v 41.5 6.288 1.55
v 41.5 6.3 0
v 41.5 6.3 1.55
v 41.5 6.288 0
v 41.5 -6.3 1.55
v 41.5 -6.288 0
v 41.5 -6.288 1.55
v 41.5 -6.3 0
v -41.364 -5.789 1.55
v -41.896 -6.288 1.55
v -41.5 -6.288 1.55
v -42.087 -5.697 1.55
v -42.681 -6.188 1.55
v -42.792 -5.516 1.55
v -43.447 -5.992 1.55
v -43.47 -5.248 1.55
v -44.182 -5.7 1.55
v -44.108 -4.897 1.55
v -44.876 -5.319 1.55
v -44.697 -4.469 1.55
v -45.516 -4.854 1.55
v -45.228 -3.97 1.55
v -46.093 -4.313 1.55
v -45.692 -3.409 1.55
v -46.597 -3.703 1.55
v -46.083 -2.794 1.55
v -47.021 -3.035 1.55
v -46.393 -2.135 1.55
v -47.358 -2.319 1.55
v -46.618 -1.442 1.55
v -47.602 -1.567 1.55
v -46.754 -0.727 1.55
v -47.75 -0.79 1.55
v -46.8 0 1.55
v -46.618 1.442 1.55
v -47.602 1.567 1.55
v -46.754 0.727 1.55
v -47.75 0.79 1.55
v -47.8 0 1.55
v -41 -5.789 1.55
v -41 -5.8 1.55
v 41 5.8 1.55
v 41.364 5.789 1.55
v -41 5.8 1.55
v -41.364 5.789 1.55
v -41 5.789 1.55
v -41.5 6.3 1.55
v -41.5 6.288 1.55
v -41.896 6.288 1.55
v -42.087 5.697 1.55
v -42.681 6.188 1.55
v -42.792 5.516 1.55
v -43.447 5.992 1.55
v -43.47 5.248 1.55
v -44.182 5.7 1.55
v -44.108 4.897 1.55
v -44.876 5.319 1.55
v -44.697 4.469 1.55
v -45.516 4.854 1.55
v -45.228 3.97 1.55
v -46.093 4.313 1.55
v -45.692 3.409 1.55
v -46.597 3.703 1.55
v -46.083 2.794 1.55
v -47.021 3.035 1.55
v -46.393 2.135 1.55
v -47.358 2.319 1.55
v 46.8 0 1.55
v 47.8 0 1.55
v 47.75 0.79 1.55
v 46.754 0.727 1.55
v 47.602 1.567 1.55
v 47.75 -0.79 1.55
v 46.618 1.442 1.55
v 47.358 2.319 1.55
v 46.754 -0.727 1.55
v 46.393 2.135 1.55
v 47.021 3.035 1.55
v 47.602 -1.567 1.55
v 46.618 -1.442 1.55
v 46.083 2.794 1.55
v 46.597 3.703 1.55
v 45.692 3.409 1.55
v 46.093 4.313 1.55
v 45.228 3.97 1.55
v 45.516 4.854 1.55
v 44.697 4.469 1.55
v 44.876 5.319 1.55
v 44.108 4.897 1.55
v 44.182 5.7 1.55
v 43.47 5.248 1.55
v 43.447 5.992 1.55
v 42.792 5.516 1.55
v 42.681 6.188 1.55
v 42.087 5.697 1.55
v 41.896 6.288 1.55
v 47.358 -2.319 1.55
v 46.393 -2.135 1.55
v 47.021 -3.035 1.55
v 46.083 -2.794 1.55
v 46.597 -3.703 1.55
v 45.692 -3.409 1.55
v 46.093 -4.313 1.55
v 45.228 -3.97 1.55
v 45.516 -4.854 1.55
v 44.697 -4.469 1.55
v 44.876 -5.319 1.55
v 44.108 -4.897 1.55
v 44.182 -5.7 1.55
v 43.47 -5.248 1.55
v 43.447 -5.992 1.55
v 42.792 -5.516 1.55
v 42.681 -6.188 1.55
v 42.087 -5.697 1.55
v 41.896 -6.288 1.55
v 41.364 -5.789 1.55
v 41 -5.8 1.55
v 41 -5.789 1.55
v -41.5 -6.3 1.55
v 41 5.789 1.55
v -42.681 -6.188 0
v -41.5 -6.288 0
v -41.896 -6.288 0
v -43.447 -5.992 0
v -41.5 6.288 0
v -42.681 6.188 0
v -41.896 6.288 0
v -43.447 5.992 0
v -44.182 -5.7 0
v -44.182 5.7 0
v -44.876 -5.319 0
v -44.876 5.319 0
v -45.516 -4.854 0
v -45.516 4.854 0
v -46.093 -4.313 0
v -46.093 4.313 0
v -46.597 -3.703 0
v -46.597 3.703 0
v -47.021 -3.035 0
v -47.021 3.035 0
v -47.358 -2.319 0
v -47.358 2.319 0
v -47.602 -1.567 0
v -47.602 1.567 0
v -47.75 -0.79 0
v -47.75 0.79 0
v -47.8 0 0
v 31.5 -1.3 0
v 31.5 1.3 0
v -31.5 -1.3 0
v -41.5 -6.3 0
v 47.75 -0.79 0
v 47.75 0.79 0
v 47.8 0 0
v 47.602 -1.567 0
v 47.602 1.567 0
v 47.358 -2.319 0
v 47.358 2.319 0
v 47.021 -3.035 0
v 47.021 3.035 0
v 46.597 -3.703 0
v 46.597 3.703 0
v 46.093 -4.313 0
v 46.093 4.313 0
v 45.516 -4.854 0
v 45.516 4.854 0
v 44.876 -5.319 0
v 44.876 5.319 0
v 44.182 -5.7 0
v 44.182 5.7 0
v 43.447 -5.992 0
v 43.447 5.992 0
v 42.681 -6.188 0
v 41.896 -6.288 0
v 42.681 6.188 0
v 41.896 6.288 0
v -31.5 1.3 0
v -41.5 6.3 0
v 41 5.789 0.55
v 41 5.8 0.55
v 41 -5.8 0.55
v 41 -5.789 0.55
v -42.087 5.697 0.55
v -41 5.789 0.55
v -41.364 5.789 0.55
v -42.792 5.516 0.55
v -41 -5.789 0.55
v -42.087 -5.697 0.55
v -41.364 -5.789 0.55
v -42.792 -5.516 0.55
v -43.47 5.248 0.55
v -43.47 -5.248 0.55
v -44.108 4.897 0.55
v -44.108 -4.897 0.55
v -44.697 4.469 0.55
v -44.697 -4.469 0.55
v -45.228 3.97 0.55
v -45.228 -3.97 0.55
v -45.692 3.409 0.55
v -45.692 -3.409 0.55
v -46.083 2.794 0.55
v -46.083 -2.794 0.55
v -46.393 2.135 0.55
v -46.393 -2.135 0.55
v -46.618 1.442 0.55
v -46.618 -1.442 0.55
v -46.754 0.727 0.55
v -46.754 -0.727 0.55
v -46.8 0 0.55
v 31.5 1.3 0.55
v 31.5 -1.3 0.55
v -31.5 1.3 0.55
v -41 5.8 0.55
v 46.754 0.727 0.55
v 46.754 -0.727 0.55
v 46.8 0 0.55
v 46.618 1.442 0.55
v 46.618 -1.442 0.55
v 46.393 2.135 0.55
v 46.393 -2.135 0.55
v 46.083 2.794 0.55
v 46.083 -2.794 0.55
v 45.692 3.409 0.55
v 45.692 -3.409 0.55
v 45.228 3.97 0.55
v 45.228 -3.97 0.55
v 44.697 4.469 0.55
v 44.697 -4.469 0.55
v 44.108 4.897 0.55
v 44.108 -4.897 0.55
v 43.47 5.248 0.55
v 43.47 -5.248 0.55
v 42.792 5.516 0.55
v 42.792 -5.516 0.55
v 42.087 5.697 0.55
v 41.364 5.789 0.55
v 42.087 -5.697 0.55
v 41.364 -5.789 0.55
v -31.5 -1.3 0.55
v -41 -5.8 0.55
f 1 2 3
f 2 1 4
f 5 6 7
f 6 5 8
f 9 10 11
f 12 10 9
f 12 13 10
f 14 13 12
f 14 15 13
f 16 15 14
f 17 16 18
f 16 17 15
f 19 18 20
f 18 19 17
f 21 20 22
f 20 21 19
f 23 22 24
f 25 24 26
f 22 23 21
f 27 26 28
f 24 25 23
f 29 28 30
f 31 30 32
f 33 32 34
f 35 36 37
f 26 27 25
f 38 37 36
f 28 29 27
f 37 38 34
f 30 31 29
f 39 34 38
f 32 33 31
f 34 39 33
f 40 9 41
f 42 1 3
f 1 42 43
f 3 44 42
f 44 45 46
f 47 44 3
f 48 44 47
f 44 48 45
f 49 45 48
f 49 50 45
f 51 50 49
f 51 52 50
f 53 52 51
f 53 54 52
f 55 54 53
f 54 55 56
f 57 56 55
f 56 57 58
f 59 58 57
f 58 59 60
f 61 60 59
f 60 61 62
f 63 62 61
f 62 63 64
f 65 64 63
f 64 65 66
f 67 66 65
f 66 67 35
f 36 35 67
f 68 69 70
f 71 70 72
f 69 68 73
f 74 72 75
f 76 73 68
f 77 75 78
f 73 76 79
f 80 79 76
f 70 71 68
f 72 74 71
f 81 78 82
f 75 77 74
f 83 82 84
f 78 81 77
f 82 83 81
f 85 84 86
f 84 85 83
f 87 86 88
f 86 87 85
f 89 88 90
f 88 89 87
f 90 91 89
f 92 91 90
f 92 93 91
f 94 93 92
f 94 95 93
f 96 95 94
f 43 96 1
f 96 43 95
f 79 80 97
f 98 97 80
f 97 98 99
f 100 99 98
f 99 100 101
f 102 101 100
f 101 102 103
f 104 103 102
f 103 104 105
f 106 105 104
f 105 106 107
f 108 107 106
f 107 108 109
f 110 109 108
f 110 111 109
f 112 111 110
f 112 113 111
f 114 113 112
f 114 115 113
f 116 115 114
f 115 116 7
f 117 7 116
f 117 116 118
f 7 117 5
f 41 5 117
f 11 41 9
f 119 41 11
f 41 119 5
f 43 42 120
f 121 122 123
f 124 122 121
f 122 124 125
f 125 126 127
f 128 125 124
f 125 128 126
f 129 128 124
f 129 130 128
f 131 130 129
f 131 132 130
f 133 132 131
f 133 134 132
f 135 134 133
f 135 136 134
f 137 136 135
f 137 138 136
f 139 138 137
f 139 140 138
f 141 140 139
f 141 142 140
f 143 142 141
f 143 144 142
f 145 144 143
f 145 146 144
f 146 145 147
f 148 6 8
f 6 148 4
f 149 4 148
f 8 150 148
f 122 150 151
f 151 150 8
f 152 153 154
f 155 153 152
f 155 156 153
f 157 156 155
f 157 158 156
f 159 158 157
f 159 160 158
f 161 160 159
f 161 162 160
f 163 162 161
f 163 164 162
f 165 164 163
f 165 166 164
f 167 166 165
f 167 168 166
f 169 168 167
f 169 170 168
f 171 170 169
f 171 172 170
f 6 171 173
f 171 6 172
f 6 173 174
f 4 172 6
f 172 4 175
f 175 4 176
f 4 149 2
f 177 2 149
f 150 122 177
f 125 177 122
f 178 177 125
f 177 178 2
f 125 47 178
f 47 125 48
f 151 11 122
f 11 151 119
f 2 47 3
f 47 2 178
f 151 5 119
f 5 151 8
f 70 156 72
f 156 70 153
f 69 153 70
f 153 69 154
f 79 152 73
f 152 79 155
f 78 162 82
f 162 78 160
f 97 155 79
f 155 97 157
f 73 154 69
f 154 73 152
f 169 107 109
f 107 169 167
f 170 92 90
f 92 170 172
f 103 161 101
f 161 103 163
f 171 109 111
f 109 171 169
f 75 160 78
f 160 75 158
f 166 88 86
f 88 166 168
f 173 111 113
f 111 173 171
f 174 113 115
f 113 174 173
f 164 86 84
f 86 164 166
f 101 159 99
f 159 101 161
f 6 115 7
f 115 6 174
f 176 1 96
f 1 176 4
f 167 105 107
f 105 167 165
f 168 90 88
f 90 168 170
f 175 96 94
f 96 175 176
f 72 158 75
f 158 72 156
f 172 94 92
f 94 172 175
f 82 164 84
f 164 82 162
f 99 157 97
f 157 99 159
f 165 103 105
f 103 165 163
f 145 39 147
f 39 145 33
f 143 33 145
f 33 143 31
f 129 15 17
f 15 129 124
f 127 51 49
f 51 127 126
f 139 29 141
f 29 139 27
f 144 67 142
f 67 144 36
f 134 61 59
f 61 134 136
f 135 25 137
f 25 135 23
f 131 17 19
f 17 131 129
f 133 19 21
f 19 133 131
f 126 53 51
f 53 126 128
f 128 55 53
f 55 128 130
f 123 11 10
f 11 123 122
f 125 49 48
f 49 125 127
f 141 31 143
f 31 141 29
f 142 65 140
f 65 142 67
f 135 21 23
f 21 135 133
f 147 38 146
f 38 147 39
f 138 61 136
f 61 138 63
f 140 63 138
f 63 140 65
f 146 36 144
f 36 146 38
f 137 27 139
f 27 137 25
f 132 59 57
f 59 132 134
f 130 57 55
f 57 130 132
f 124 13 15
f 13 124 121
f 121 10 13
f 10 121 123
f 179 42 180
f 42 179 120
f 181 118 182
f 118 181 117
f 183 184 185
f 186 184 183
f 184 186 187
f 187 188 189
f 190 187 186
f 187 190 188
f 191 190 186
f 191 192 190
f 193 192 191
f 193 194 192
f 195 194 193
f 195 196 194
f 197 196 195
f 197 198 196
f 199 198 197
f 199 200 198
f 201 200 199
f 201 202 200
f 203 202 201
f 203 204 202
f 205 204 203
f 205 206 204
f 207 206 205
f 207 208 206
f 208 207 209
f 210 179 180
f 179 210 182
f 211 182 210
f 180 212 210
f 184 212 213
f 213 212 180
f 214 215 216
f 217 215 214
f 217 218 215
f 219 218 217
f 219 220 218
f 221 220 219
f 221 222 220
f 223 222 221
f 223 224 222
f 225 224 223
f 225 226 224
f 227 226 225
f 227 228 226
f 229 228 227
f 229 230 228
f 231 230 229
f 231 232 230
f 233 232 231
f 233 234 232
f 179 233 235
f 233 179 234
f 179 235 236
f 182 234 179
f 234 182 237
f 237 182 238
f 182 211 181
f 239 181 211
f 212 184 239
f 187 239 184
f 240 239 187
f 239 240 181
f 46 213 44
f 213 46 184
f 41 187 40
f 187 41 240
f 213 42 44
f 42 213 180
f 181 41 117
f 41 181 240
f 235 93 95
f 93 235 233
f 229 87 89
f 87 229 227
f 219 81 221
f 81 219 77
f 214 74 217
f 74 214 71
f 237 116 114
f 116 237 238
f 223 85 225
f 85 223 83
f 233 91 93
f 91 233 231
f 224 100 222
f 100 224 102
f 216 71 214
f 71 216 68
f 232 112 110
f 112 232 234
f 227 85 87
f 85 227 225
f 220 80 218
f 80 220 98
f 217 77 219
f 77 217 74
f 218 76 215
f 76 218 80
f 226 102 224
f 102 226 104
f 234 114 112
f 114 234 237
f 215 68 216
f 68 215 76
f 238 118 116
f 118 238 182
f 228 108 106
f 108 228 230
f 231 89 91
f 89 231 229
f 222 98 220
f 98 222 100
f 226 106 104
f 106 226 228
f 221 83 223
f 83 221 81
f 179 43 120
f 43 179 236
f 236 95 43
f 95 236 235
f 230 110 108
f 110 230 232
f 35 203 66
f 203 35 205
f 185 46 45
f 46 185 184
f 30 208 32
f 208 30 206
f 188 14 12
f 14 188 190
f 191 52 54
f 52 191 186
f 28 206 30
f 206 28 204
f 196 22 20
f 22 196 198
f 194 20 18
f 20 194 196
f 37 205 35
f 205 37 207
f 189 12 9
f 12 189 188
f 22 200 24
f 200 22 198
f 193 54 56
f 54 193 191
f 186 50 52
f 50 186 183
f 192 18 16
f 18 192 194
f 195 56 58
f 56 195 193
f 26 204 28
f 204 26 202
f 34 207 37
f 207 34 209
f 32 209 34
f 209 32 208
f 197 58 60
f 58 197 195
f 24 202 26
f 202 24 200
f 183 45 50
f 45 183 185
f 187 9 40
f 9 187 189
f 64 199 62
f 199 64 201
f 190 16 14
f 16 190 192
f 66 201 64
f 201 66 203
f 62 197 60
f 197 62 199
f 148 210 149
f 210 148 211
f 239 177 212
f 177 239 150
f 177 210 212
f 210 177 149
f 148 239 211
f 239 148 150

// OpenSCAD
// Maximum width of the fretboard
fretBoardWidth = 63;
// Width of a fret
fretWidth = 2.6;
// Height of a fret
fretHeight = 1.1;
// Calculated parameters, don't touch!
baseWidth = fretBoardWidth + 20;
baseLength = fretWidth + 2*5;
baseHeight = fretHeight/2;
edgeWidth = 1*1;
edgeHeight = 1*1;
$fn=50*1;

module base(width, length, height) {
   translate([0,0, height/2]) { 
        cube([width, length, height], true);
        translate([width/2, 0, -height/2]) {
            cylinder(height, d=length, true);
        }
        translate([-width/2, 0, -height/2]) {
            cylinder(height, d=length, true);
        }    
    }
}

module cutout() {
    cube([fretBoardWidth, fretWidth, (baseHeight+edgeHeight)*2], true);
}


difference() {
    base(baseWidth, baseLength, baseHeight + edgeHeight);
    translate([0, 0, baseHeight]) {
        base(baseWidth-edgeWidth, baseLength-edgeWidth, edgeHeight*2);
    }
    cutout();
}
